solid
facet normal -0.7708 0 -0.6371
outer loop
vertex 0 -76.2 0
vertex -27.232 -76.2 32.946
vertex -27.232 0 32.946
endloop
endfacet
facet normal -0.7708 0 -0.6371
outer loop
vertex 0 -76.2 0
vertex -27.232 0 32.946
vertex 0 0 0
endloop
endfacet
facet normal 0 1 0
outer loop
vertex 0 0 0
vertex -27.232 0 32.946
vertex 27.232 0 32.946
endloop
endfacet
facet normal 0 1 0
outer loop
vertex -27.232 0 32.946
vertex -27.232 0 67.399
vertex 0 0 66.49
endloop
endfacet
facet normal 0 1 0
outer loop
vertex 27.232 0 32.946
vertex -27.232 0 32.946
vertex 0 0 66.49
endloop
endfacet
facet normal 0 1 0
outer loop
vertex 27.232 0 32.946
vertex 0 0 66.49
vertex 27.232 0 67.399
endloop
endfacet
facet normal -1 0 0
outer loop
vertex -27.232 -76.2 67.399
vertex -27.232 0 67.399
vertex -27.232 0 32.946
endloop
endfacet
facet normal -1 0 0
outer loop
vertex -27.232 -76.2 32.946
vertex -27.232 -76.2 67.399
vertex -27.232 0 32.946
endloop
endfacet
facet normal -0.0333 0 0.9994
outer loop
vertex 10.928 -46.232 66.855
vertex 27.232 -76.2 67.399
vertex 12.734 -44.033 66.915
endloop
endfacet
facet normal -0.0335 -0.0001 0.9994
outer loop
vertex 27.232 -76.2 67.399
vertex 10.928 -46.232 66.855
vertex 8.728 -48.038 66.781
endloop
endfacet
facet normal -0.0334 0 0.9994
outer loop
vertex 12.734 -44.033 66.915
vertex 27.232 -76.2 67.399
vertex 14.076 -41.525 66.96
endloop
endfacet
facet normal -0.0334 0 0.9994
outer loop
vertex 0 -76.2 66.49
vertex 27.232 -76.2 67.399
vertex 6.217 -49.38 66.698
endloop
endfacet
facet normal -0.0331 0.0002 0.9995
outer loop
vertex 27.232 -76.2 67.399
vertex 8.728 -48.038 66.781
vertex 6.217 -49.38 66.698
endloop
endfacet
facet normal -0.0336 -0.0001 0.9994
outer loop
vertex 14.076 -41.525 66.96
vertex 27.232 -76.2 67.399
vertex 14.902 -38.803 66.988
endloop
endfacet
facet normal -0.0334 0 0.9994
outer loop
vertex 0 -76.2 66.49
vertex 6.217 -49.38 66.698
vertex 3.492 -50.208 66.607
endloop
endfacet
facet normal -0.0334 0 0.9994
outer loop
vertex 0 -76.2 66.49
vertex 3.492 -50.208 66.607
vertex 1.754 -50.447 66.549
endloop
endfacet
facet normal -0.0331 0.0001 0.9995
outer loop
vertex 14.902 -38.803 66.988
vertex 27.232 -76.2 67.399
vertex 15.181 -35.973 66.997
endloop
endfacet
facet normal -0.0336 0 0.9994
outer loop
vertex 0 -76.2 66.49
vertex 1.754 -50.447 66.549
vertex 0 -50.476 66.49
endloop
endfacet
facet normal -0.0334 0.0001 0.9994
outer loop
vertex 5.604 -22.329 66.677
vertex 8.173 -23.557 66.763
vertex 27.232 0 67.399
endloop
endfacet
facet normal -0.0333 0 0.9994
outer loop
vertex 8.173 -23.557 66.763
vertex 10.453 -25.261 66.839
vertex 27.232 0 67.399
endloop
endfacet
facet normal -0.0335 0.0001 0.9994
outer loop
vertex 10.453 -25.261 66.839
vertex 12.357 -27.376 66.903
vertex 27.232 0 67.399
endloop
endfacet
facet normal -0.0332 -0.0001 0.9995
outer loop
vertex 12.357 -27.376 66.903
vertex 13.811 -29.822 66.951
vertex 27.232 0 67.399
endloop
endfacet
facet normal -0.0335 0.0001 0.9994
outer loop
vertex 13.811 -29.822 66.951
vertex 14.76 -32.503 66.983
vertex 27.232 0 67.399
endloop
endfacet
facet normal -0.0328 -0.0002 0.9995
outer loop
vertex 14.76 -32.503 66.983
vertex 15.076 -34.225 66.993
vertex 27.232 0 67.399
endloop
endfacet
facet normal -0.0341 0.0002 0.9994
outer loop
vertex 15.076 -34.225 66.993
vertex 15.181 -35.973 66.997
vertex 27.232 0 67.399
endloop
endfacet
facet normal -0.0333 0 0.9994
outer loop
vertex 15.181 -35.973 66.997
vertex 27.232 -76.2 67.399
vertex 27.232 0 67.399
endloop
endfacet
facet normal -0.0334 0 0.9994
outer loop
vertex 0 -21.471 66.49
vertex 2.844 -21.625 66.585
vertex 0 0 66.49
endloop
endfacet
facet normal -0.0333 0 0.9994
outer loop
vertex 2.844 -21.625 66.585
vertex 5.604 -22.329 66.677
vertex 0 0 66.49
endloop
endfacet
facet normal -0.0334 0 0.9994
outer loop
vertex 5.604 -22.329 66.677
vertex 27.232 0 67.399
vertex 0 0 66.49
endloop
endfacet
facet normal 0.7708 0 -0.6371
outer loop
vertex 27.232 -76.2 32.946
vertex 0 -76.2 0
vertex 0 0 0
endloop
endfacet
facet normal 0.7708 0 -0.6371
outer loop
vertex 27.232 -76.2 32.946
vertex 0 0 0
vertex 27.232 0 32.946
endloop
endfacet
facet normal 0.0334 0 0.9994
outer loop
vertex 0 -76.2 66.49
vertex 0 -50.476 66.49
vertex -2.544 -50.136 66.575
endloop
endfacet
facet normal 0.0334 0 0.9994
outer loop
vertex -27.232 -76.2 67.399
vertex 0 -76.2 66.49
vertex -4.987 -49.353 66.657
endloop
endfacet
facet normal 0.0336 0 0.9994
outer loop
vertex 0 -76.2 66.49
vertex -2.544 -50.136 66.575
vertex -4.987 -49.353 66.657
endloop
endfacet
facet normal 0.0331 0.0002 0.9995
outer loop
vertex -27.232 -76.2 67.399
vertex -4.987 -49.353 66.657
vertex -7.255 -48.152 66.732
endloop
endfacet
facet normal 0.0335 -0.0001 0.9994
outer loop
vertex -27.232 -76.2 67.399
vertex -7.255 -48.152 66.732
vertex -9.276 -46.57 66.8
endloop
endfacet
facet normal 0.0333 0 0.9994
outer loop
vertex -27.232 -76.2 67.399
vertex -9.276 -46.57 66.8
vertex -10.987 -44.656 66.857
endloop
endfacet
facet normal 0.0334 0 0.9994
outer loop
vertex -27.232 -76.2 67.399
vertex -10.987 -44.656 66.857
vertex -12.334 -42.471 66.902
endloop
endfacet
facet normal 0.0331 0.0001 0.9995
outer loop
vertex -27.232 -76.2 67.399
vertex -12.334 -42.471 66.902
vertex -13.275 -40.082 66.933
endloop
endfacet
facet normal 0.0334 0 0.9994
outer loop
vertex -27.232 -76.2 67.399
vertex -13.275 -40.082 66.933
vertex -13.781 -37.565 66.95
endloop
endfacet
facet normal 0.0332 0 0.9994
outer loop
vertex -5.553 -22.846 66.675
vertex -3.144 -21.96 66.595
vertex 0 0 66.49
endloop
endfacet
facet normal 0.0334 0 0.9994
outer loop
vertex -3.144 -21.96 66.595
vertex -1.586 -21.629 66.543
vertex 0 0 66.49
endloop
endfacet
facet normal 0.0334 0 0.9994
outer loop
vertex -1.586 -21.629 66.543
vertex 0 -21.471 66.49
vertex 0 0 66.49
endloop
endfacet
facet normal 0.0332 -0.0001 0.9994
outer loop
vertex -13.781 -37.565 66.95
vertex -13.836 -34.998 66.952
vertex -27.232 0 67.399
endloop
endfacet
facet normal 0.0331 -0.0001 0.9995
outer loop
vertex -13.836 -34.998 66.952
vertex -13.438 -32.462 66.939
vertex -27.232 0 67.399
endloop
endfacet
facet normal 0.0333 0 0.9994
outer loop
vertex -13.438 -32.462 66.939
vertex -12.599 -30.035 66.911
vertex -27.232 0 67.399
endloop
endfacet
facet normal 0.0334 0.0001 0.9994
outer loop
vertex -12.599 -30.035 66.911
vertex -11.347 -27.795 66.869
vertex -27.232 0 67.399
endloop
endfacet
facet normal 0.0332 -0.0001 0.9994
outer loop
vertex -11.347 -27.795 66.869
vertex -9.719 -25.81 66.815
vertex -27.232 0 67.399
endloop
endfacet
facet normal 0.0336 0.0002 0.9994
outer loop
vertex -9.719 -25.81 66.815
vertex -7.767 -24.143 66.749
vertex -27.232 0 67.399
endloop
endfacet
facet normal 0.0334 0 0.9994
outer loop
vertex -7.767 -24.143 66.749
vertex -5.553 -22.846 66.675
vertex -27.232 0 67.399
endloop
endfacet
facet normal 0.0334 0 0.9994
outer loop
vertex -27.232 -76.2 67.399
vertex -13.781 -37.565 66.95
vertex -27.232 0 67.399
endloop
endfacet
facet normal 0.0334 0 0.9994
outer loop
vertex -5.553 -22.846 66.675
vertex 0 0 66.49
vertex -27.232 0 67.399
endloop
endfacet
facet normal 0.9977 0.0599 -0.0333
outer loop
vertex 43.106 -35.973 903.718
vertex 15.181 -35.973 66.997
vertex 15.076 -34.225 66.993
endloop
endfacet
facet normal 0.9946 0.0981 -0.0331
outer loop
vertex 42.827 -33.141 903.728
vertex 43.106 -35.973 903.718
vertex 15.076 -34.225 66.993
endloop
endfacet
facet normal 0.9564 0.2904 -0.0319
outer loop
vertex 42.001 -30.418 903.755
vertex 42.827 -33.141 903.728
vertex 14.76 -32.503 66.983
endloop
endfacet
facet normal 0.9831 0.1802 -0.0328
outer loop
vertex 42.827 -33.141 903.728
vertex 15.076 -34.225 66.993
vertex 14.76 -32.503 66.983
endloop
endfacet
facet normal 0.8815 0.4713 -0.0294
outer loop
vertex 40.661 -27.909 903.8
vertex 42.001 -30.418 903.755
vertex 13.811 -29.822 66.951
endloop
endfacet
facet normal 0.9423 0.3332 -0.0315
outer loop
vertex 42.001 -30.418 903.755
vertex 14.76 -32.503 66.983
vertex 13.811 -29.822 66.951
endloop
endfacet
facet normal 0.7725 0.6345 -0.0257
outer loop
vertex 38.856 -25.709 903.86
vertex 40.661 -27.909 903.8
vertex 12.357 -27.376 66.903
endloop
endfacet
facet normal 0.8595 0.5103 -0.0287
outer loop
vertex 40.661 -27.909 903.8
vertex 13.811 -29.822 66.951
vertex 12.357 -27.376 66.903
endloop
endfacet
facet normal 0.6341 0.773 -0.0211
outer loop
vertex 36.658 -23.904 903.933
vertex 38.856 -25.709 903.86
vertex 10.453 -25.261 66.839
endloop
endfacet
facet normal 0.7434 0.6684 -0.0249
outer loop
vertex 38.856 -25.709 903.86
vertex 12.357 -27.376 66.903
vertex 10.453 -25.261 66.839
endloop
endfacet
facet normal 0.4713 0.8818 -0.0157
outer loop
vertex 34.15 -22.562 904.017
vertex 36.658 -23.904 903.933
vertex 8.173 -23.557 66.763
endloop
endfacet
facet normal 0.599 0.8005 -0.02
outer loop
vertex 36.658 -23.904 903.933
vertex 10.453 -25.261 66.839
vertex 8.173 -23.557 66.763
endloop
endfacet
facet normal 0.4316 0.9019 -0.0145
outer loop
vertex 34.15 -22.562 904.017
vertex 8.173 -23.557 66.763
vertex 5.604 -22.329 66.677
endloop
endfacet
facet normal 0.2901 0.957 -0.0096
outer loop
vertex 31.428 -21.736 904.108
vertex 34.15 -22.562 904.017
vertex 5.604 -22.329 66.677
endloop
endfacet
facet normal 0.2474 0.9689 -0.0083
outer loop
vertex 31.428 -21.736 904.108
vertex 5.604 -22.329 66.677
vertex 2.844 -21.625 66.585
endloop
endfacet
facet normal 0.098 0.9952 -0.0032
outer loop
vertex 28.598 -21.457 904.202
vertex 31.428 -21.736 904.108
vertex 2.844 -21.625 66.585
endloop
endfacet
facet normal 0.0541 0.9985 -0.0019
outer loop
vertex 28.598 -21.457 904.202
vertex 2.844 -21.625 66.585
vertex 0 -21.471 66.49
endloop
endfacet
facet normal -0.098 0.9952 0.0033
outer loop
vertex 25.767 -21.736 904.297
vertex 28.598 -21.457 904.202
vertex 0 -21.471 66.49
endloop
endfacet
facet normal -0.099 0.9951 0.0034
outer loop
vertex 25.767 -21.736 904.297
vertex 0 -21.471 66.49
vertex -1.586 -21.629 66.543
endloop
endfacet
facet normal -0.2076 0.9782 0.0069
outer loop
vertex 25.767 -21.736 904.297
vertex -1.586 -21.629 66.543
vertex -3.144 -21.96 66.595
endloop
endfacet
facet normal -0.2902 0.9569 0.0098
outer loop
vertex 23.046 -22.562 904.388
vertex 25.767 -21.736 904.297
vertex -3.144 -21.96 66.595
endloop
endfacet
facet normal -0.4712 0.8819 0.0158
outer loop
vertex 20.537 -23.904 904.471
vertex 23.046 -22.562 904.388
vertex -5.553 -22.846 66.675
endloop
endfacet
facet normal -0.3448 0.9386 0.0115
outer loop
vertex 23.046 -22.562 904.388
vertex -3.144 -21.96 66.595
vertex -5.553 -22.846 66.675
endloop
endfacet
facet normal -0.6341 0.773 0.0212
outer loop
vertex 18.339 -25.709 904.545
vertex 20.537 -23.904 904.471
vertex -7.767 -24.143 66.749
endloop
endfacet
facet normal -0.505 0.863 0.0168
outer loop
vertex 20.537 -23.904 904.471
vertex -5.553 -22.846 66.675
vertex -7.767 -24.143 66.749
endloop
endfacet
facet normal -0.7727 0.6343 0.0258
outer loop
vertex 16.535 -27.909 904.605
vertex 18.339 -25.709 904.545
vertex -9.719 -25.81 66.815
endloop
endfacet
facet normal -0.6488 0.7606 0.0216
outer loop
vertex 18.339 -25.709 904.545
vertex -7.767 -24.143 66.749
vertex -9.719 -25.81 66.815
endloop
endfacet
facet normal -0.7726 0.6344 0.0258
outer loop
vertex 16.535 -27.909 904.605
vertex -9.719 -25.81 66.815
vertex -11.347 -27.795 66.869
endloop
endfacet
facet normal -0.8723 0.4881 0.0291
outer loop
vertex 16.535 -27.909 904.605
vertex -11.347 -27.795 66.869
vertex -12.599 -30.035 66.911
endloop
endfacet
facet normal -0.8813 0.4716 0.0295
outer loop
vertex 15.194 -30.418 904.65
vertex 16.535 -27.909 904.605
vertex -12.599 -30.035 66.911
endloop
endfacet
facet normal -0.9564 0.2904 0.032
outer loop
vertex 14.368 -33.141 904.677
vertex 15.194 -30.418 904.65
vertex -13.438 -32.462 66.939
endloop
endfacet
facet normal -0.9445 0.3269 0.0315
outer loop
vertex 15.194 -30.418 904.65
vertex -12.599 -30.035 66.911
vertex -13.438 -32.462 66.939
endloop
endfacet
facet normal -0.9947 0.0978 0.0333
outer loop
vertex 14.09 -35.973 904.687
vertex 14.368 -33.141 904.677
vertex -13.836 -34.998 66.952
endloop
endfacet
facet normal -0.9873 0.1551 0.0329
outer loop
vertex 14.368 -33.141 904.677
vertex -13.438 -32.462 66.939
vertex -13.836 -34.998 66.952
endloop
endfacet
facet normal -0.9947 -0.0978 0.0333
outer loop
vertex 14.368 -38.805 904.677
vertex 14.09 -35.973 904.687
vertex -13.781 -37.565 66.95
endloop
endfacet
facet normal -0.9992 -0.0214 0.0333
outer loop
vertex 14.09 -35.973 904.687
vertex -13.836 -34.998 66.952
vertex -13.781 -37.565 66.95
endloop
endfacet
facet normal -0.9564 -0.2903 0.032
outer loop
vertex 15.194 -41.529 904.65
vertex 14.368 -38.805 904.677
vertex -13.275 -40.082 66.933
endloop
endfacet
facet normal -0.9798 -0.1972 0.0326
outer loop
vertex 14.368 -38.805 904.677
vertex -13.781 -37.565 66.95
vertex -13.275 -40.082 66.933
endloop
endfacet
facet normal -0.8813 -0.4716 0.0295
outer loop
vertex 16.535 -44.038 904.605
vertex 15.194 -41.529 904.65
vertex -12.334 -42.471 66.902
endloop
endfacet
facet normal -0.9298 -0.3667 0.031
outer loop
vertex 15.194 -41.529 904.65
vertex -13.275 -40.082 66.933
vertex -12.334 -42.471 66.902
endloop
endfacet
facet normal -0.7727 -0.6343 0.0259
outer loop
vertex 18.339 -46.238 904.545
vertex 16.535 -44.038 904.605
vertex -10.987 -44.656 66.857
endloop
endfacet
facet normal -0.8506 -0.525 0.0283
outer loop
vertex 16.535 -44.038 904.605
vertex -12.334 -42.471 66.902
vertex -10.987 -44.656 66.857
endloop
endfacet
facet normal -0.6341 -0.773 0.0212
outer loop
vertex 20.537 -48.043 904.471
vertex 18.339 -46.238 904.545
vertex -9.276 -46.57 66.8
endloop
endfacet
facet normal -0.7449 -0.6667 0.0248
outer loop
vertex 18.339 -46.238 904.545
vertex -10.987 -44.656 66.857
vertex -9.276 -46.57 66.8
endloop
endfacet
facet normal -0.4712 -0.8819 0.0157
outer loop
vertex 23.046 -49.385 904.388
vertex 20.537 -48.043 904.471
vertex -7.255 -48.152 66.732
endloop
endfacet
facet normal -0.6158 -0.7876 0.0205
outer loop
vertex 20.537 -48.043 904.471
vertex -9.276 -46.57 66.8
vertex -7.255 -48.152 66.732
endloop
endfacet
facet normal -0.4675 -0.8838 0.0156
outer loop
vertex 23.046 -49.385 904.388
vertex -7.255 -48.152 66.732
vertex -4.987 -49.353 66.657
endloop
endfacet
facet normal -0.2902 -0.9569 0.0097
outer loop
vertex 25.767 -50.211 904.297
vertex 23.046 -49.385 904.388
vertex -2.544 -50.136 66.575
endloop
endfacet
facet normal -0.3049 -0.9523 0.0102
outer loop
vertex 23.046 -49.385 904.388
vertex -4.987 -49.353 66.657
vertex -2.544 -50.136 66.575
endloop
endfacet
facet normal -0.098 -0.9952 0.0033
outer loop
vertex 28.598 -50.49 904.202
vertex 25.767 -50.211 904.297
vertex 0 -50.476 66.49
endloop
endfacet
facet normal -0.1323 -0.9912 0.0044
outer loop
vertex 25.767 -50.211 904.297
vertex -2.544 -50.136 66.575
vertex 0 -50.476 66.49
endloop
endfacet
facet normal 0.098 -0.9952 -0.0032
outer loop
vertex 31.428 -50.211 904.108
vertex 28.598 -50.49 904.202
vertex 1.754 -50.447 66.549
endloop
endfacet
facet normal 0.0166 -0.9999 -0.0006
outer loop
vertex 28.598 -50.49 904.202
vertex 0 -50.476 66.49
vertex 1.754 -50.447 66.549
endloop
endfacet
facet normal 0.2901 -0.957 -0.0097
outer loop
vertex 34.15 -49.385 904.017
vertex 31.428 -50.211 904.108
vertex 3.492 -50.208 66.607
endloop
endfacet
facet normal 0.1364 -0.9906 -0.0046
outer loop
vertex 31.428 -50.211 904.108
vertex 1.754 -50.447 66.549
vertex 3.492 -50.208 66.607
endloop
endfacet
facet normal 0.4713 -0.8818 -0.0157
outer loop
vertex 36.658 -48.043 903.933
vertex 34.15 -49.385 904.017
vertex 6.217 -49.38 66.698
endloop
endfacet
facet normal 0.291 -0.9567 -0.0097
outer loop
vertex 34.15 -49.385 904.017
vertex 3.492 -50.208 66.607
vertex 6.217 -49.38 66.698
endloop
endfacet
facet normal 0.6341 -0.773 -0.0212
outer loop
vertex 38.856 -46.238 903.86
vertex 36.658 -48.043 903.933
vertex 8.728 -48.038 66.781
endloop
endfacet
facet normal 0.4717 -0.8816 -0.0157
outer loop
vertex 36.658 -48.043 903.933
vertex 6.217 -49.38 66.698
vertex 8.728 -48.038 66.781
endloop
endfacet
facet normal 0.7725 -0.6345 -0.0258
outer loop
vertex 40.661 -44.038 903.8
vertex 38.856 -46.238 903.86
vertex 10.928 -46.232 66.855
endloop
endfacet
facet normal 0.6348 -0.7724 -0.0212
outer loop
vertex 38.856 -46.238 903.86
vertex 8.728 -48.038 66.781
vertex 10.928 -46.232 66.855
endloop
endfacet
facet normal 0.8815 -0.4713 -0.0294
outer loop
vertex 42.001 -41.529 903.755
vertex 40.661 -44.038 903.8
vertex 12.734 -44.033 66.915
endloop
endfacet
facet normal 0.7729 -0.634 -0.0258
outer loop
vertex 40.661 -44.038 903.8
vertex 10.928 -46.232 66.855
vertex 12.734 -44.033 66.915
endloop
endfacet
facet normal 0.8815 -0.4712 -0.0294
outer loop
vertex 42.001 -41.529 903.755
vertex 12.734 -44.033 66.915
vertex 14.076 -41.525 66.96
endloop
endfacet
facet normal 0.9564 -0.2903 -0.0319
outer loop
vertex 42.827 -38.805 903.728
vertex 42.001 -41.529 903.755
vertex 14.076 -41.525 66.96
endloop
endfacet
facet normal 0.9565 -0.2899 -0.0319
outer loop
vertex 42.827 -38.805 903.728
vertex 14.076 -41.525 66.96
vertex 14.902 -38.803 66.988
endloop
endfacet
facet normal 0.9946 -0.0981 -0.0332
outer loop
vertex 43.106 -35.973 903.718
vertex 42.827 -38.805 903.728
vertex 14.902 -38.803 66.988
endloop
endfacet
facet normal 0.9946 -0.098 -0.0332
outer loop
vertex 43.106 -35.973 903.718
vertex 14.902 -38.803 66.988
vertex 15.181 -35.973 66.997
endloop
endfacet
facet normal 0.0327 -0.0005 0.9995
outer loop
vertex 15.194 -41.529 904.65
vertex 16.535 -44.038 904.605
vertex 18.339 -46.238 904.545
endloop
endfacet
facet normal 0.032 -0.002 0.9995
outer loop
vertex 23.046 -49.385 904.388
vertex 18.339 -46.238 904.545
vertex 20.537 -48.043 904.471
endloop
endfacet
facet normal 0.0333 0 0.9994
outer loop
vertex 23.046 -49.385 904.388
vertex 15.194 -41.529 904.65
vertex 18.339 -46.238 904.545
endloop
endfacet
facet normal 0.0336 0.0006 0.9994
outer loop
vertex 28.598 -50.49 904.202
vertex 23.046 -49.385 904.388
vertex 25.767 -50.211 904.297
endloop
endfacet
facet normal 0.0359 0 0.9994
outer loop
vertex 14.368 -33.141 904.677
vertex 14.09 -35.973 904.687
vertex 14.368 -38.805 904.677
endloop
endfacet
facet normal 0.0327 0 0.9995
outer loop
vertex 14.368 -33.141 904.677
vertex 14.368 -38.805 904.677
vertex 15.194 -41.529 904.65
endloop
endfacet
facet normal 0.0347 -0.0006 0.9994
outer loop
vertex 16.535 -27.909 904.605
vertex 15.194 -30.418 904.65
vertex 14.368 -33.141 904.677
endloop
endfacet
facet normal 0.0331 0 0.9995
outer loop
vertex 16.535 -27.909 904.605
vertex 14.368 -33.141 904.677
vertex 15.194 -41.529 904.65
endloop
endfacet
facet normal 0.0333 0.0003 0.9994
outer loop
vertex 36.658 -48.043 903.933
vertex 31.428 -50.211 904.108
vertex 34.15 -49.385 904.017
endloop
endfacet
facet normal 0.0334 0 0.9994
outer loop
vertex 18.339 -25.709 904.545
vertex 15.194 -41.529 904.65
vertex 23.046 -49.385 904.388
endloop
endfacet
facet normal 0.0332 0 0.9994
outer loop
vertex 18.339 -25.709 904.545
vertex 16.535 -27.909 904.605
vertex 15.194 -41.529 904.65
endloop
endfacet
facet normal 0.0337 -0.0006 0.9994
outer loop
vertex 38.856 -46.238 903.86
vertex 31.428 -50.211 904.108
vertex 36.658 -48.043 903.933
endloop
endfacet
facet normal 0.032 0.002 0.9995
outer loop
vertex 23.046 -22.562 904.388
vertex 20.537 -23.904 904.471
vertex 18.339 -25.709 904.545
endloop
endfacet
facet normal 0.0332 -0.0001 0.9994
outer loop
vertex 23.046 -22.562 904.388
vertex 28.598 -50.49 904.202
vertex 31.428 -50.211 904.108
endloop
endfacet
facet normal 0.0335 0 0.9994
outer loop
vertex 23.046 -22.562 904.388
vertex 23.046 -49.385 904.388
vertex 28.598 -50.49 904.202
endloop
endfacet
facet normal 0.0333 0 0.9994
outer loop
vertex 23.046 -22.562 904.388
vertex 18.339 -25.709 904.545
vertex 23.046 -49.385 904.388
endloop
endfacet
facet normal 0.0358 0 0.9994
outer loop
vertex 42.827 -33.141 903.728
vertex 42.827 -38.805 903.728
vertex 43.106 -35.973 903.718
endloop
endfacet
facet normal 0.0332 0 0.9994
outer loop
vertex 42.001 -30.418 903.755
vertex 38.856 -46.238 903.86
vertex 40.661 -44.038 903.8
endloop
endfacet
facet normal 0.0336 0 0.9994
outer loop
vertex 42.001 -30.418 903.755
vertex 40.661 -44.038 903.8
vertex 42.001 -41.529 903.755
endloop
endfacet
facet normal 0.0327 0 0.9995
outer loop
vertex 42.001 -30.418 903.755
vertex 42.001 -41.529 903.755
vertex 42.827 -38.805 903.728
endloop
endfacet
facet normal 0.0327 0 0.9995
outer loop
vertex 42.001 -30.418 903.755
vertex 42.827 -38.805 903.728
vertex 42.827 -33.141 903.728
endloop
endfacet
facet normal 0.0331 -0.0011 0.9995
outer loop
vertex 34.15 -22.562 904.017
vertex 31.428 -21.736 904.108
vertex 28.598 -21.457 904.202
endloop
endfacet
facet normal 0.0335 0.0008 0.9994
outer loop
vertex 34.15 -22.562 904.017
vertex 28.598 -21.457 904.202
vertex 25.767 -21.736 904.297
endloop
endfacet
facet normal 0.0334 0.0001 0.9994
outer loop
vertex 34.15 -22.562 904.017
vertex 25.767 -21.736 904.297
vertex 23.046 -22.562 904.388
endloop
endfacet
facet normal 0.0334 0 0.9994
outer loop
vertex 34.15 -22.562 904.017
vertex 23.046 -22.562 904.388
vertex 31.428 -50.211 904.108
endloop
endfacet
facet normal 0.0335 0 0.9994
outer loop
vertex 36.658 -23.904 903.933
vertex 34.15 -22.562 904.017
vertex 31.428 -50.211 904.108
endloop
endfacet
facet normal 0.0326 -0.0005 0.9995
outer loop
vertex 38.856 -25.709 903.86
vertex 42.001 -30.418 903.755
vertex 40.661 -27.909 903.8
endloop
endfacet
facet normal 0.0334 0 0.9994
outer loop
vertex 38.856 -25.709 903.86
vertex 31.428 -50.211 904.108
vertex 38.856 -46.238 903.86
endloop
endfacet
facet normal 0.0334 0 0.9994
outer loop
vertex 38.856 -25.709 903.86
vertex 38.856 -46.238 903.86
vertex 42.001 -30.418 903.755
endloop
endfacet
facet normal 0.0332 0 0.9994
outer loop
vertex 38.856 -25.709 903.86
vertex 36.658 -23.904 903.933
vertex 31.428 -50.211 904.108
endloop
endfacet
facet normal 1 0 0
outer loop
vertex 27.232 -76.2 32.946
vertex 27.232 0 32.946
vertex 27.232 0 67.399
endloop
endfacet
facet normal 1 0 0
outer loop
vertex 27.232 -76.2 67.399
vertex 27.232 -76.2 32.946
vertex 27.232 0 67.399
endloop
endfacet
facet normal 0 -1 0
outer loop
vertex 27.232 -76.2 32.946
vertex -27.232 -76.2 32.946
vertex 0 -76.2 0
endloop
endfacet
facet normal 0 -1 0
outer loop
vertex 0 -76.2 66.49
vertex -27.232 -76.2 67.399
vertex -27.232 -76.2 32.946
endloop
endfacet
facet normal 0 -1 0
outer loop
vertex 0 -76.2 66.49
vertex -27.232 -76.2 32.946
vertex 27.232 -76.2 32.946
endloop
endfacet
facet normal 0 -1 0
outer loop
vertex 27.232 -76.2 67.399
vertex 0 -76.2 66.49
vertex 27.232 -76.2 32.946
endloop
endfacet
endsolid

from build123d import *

# Parameters (mm, degrees)
F1_DEPTH = 76.2
F2_R     = 14.516213
F3_DEPTH = 838.2


with BuildPart() as f1:
    # F0 (on Front) → F1 (new body)
    with BuildSketch(Plane.XZ):
        Polygon((0, 66.490166), (0, 0), (27.231932, 32.945991), (27.231932, 67.398995), align=None)
        Polygon((-27.231932, 32.945991), (0, 0), (0, 66.490166), (-27.231932, 67.398995), align=None)
    extrude(amount=F1_DEPTH)

    # F2 (on face) → F3 (join)
    with BuildSketch(Plane(origin=(2.216551, 0, 66.416191), x_dir=(0.999444, 0, -0.033355), z_dir=(0.033355, 0, 0.999444))):
        with Locations((-1.577918, -35.97346)):
            Circle(F2_R)
    extrude(amount=F3_DEPTH)


solid = f1.part
